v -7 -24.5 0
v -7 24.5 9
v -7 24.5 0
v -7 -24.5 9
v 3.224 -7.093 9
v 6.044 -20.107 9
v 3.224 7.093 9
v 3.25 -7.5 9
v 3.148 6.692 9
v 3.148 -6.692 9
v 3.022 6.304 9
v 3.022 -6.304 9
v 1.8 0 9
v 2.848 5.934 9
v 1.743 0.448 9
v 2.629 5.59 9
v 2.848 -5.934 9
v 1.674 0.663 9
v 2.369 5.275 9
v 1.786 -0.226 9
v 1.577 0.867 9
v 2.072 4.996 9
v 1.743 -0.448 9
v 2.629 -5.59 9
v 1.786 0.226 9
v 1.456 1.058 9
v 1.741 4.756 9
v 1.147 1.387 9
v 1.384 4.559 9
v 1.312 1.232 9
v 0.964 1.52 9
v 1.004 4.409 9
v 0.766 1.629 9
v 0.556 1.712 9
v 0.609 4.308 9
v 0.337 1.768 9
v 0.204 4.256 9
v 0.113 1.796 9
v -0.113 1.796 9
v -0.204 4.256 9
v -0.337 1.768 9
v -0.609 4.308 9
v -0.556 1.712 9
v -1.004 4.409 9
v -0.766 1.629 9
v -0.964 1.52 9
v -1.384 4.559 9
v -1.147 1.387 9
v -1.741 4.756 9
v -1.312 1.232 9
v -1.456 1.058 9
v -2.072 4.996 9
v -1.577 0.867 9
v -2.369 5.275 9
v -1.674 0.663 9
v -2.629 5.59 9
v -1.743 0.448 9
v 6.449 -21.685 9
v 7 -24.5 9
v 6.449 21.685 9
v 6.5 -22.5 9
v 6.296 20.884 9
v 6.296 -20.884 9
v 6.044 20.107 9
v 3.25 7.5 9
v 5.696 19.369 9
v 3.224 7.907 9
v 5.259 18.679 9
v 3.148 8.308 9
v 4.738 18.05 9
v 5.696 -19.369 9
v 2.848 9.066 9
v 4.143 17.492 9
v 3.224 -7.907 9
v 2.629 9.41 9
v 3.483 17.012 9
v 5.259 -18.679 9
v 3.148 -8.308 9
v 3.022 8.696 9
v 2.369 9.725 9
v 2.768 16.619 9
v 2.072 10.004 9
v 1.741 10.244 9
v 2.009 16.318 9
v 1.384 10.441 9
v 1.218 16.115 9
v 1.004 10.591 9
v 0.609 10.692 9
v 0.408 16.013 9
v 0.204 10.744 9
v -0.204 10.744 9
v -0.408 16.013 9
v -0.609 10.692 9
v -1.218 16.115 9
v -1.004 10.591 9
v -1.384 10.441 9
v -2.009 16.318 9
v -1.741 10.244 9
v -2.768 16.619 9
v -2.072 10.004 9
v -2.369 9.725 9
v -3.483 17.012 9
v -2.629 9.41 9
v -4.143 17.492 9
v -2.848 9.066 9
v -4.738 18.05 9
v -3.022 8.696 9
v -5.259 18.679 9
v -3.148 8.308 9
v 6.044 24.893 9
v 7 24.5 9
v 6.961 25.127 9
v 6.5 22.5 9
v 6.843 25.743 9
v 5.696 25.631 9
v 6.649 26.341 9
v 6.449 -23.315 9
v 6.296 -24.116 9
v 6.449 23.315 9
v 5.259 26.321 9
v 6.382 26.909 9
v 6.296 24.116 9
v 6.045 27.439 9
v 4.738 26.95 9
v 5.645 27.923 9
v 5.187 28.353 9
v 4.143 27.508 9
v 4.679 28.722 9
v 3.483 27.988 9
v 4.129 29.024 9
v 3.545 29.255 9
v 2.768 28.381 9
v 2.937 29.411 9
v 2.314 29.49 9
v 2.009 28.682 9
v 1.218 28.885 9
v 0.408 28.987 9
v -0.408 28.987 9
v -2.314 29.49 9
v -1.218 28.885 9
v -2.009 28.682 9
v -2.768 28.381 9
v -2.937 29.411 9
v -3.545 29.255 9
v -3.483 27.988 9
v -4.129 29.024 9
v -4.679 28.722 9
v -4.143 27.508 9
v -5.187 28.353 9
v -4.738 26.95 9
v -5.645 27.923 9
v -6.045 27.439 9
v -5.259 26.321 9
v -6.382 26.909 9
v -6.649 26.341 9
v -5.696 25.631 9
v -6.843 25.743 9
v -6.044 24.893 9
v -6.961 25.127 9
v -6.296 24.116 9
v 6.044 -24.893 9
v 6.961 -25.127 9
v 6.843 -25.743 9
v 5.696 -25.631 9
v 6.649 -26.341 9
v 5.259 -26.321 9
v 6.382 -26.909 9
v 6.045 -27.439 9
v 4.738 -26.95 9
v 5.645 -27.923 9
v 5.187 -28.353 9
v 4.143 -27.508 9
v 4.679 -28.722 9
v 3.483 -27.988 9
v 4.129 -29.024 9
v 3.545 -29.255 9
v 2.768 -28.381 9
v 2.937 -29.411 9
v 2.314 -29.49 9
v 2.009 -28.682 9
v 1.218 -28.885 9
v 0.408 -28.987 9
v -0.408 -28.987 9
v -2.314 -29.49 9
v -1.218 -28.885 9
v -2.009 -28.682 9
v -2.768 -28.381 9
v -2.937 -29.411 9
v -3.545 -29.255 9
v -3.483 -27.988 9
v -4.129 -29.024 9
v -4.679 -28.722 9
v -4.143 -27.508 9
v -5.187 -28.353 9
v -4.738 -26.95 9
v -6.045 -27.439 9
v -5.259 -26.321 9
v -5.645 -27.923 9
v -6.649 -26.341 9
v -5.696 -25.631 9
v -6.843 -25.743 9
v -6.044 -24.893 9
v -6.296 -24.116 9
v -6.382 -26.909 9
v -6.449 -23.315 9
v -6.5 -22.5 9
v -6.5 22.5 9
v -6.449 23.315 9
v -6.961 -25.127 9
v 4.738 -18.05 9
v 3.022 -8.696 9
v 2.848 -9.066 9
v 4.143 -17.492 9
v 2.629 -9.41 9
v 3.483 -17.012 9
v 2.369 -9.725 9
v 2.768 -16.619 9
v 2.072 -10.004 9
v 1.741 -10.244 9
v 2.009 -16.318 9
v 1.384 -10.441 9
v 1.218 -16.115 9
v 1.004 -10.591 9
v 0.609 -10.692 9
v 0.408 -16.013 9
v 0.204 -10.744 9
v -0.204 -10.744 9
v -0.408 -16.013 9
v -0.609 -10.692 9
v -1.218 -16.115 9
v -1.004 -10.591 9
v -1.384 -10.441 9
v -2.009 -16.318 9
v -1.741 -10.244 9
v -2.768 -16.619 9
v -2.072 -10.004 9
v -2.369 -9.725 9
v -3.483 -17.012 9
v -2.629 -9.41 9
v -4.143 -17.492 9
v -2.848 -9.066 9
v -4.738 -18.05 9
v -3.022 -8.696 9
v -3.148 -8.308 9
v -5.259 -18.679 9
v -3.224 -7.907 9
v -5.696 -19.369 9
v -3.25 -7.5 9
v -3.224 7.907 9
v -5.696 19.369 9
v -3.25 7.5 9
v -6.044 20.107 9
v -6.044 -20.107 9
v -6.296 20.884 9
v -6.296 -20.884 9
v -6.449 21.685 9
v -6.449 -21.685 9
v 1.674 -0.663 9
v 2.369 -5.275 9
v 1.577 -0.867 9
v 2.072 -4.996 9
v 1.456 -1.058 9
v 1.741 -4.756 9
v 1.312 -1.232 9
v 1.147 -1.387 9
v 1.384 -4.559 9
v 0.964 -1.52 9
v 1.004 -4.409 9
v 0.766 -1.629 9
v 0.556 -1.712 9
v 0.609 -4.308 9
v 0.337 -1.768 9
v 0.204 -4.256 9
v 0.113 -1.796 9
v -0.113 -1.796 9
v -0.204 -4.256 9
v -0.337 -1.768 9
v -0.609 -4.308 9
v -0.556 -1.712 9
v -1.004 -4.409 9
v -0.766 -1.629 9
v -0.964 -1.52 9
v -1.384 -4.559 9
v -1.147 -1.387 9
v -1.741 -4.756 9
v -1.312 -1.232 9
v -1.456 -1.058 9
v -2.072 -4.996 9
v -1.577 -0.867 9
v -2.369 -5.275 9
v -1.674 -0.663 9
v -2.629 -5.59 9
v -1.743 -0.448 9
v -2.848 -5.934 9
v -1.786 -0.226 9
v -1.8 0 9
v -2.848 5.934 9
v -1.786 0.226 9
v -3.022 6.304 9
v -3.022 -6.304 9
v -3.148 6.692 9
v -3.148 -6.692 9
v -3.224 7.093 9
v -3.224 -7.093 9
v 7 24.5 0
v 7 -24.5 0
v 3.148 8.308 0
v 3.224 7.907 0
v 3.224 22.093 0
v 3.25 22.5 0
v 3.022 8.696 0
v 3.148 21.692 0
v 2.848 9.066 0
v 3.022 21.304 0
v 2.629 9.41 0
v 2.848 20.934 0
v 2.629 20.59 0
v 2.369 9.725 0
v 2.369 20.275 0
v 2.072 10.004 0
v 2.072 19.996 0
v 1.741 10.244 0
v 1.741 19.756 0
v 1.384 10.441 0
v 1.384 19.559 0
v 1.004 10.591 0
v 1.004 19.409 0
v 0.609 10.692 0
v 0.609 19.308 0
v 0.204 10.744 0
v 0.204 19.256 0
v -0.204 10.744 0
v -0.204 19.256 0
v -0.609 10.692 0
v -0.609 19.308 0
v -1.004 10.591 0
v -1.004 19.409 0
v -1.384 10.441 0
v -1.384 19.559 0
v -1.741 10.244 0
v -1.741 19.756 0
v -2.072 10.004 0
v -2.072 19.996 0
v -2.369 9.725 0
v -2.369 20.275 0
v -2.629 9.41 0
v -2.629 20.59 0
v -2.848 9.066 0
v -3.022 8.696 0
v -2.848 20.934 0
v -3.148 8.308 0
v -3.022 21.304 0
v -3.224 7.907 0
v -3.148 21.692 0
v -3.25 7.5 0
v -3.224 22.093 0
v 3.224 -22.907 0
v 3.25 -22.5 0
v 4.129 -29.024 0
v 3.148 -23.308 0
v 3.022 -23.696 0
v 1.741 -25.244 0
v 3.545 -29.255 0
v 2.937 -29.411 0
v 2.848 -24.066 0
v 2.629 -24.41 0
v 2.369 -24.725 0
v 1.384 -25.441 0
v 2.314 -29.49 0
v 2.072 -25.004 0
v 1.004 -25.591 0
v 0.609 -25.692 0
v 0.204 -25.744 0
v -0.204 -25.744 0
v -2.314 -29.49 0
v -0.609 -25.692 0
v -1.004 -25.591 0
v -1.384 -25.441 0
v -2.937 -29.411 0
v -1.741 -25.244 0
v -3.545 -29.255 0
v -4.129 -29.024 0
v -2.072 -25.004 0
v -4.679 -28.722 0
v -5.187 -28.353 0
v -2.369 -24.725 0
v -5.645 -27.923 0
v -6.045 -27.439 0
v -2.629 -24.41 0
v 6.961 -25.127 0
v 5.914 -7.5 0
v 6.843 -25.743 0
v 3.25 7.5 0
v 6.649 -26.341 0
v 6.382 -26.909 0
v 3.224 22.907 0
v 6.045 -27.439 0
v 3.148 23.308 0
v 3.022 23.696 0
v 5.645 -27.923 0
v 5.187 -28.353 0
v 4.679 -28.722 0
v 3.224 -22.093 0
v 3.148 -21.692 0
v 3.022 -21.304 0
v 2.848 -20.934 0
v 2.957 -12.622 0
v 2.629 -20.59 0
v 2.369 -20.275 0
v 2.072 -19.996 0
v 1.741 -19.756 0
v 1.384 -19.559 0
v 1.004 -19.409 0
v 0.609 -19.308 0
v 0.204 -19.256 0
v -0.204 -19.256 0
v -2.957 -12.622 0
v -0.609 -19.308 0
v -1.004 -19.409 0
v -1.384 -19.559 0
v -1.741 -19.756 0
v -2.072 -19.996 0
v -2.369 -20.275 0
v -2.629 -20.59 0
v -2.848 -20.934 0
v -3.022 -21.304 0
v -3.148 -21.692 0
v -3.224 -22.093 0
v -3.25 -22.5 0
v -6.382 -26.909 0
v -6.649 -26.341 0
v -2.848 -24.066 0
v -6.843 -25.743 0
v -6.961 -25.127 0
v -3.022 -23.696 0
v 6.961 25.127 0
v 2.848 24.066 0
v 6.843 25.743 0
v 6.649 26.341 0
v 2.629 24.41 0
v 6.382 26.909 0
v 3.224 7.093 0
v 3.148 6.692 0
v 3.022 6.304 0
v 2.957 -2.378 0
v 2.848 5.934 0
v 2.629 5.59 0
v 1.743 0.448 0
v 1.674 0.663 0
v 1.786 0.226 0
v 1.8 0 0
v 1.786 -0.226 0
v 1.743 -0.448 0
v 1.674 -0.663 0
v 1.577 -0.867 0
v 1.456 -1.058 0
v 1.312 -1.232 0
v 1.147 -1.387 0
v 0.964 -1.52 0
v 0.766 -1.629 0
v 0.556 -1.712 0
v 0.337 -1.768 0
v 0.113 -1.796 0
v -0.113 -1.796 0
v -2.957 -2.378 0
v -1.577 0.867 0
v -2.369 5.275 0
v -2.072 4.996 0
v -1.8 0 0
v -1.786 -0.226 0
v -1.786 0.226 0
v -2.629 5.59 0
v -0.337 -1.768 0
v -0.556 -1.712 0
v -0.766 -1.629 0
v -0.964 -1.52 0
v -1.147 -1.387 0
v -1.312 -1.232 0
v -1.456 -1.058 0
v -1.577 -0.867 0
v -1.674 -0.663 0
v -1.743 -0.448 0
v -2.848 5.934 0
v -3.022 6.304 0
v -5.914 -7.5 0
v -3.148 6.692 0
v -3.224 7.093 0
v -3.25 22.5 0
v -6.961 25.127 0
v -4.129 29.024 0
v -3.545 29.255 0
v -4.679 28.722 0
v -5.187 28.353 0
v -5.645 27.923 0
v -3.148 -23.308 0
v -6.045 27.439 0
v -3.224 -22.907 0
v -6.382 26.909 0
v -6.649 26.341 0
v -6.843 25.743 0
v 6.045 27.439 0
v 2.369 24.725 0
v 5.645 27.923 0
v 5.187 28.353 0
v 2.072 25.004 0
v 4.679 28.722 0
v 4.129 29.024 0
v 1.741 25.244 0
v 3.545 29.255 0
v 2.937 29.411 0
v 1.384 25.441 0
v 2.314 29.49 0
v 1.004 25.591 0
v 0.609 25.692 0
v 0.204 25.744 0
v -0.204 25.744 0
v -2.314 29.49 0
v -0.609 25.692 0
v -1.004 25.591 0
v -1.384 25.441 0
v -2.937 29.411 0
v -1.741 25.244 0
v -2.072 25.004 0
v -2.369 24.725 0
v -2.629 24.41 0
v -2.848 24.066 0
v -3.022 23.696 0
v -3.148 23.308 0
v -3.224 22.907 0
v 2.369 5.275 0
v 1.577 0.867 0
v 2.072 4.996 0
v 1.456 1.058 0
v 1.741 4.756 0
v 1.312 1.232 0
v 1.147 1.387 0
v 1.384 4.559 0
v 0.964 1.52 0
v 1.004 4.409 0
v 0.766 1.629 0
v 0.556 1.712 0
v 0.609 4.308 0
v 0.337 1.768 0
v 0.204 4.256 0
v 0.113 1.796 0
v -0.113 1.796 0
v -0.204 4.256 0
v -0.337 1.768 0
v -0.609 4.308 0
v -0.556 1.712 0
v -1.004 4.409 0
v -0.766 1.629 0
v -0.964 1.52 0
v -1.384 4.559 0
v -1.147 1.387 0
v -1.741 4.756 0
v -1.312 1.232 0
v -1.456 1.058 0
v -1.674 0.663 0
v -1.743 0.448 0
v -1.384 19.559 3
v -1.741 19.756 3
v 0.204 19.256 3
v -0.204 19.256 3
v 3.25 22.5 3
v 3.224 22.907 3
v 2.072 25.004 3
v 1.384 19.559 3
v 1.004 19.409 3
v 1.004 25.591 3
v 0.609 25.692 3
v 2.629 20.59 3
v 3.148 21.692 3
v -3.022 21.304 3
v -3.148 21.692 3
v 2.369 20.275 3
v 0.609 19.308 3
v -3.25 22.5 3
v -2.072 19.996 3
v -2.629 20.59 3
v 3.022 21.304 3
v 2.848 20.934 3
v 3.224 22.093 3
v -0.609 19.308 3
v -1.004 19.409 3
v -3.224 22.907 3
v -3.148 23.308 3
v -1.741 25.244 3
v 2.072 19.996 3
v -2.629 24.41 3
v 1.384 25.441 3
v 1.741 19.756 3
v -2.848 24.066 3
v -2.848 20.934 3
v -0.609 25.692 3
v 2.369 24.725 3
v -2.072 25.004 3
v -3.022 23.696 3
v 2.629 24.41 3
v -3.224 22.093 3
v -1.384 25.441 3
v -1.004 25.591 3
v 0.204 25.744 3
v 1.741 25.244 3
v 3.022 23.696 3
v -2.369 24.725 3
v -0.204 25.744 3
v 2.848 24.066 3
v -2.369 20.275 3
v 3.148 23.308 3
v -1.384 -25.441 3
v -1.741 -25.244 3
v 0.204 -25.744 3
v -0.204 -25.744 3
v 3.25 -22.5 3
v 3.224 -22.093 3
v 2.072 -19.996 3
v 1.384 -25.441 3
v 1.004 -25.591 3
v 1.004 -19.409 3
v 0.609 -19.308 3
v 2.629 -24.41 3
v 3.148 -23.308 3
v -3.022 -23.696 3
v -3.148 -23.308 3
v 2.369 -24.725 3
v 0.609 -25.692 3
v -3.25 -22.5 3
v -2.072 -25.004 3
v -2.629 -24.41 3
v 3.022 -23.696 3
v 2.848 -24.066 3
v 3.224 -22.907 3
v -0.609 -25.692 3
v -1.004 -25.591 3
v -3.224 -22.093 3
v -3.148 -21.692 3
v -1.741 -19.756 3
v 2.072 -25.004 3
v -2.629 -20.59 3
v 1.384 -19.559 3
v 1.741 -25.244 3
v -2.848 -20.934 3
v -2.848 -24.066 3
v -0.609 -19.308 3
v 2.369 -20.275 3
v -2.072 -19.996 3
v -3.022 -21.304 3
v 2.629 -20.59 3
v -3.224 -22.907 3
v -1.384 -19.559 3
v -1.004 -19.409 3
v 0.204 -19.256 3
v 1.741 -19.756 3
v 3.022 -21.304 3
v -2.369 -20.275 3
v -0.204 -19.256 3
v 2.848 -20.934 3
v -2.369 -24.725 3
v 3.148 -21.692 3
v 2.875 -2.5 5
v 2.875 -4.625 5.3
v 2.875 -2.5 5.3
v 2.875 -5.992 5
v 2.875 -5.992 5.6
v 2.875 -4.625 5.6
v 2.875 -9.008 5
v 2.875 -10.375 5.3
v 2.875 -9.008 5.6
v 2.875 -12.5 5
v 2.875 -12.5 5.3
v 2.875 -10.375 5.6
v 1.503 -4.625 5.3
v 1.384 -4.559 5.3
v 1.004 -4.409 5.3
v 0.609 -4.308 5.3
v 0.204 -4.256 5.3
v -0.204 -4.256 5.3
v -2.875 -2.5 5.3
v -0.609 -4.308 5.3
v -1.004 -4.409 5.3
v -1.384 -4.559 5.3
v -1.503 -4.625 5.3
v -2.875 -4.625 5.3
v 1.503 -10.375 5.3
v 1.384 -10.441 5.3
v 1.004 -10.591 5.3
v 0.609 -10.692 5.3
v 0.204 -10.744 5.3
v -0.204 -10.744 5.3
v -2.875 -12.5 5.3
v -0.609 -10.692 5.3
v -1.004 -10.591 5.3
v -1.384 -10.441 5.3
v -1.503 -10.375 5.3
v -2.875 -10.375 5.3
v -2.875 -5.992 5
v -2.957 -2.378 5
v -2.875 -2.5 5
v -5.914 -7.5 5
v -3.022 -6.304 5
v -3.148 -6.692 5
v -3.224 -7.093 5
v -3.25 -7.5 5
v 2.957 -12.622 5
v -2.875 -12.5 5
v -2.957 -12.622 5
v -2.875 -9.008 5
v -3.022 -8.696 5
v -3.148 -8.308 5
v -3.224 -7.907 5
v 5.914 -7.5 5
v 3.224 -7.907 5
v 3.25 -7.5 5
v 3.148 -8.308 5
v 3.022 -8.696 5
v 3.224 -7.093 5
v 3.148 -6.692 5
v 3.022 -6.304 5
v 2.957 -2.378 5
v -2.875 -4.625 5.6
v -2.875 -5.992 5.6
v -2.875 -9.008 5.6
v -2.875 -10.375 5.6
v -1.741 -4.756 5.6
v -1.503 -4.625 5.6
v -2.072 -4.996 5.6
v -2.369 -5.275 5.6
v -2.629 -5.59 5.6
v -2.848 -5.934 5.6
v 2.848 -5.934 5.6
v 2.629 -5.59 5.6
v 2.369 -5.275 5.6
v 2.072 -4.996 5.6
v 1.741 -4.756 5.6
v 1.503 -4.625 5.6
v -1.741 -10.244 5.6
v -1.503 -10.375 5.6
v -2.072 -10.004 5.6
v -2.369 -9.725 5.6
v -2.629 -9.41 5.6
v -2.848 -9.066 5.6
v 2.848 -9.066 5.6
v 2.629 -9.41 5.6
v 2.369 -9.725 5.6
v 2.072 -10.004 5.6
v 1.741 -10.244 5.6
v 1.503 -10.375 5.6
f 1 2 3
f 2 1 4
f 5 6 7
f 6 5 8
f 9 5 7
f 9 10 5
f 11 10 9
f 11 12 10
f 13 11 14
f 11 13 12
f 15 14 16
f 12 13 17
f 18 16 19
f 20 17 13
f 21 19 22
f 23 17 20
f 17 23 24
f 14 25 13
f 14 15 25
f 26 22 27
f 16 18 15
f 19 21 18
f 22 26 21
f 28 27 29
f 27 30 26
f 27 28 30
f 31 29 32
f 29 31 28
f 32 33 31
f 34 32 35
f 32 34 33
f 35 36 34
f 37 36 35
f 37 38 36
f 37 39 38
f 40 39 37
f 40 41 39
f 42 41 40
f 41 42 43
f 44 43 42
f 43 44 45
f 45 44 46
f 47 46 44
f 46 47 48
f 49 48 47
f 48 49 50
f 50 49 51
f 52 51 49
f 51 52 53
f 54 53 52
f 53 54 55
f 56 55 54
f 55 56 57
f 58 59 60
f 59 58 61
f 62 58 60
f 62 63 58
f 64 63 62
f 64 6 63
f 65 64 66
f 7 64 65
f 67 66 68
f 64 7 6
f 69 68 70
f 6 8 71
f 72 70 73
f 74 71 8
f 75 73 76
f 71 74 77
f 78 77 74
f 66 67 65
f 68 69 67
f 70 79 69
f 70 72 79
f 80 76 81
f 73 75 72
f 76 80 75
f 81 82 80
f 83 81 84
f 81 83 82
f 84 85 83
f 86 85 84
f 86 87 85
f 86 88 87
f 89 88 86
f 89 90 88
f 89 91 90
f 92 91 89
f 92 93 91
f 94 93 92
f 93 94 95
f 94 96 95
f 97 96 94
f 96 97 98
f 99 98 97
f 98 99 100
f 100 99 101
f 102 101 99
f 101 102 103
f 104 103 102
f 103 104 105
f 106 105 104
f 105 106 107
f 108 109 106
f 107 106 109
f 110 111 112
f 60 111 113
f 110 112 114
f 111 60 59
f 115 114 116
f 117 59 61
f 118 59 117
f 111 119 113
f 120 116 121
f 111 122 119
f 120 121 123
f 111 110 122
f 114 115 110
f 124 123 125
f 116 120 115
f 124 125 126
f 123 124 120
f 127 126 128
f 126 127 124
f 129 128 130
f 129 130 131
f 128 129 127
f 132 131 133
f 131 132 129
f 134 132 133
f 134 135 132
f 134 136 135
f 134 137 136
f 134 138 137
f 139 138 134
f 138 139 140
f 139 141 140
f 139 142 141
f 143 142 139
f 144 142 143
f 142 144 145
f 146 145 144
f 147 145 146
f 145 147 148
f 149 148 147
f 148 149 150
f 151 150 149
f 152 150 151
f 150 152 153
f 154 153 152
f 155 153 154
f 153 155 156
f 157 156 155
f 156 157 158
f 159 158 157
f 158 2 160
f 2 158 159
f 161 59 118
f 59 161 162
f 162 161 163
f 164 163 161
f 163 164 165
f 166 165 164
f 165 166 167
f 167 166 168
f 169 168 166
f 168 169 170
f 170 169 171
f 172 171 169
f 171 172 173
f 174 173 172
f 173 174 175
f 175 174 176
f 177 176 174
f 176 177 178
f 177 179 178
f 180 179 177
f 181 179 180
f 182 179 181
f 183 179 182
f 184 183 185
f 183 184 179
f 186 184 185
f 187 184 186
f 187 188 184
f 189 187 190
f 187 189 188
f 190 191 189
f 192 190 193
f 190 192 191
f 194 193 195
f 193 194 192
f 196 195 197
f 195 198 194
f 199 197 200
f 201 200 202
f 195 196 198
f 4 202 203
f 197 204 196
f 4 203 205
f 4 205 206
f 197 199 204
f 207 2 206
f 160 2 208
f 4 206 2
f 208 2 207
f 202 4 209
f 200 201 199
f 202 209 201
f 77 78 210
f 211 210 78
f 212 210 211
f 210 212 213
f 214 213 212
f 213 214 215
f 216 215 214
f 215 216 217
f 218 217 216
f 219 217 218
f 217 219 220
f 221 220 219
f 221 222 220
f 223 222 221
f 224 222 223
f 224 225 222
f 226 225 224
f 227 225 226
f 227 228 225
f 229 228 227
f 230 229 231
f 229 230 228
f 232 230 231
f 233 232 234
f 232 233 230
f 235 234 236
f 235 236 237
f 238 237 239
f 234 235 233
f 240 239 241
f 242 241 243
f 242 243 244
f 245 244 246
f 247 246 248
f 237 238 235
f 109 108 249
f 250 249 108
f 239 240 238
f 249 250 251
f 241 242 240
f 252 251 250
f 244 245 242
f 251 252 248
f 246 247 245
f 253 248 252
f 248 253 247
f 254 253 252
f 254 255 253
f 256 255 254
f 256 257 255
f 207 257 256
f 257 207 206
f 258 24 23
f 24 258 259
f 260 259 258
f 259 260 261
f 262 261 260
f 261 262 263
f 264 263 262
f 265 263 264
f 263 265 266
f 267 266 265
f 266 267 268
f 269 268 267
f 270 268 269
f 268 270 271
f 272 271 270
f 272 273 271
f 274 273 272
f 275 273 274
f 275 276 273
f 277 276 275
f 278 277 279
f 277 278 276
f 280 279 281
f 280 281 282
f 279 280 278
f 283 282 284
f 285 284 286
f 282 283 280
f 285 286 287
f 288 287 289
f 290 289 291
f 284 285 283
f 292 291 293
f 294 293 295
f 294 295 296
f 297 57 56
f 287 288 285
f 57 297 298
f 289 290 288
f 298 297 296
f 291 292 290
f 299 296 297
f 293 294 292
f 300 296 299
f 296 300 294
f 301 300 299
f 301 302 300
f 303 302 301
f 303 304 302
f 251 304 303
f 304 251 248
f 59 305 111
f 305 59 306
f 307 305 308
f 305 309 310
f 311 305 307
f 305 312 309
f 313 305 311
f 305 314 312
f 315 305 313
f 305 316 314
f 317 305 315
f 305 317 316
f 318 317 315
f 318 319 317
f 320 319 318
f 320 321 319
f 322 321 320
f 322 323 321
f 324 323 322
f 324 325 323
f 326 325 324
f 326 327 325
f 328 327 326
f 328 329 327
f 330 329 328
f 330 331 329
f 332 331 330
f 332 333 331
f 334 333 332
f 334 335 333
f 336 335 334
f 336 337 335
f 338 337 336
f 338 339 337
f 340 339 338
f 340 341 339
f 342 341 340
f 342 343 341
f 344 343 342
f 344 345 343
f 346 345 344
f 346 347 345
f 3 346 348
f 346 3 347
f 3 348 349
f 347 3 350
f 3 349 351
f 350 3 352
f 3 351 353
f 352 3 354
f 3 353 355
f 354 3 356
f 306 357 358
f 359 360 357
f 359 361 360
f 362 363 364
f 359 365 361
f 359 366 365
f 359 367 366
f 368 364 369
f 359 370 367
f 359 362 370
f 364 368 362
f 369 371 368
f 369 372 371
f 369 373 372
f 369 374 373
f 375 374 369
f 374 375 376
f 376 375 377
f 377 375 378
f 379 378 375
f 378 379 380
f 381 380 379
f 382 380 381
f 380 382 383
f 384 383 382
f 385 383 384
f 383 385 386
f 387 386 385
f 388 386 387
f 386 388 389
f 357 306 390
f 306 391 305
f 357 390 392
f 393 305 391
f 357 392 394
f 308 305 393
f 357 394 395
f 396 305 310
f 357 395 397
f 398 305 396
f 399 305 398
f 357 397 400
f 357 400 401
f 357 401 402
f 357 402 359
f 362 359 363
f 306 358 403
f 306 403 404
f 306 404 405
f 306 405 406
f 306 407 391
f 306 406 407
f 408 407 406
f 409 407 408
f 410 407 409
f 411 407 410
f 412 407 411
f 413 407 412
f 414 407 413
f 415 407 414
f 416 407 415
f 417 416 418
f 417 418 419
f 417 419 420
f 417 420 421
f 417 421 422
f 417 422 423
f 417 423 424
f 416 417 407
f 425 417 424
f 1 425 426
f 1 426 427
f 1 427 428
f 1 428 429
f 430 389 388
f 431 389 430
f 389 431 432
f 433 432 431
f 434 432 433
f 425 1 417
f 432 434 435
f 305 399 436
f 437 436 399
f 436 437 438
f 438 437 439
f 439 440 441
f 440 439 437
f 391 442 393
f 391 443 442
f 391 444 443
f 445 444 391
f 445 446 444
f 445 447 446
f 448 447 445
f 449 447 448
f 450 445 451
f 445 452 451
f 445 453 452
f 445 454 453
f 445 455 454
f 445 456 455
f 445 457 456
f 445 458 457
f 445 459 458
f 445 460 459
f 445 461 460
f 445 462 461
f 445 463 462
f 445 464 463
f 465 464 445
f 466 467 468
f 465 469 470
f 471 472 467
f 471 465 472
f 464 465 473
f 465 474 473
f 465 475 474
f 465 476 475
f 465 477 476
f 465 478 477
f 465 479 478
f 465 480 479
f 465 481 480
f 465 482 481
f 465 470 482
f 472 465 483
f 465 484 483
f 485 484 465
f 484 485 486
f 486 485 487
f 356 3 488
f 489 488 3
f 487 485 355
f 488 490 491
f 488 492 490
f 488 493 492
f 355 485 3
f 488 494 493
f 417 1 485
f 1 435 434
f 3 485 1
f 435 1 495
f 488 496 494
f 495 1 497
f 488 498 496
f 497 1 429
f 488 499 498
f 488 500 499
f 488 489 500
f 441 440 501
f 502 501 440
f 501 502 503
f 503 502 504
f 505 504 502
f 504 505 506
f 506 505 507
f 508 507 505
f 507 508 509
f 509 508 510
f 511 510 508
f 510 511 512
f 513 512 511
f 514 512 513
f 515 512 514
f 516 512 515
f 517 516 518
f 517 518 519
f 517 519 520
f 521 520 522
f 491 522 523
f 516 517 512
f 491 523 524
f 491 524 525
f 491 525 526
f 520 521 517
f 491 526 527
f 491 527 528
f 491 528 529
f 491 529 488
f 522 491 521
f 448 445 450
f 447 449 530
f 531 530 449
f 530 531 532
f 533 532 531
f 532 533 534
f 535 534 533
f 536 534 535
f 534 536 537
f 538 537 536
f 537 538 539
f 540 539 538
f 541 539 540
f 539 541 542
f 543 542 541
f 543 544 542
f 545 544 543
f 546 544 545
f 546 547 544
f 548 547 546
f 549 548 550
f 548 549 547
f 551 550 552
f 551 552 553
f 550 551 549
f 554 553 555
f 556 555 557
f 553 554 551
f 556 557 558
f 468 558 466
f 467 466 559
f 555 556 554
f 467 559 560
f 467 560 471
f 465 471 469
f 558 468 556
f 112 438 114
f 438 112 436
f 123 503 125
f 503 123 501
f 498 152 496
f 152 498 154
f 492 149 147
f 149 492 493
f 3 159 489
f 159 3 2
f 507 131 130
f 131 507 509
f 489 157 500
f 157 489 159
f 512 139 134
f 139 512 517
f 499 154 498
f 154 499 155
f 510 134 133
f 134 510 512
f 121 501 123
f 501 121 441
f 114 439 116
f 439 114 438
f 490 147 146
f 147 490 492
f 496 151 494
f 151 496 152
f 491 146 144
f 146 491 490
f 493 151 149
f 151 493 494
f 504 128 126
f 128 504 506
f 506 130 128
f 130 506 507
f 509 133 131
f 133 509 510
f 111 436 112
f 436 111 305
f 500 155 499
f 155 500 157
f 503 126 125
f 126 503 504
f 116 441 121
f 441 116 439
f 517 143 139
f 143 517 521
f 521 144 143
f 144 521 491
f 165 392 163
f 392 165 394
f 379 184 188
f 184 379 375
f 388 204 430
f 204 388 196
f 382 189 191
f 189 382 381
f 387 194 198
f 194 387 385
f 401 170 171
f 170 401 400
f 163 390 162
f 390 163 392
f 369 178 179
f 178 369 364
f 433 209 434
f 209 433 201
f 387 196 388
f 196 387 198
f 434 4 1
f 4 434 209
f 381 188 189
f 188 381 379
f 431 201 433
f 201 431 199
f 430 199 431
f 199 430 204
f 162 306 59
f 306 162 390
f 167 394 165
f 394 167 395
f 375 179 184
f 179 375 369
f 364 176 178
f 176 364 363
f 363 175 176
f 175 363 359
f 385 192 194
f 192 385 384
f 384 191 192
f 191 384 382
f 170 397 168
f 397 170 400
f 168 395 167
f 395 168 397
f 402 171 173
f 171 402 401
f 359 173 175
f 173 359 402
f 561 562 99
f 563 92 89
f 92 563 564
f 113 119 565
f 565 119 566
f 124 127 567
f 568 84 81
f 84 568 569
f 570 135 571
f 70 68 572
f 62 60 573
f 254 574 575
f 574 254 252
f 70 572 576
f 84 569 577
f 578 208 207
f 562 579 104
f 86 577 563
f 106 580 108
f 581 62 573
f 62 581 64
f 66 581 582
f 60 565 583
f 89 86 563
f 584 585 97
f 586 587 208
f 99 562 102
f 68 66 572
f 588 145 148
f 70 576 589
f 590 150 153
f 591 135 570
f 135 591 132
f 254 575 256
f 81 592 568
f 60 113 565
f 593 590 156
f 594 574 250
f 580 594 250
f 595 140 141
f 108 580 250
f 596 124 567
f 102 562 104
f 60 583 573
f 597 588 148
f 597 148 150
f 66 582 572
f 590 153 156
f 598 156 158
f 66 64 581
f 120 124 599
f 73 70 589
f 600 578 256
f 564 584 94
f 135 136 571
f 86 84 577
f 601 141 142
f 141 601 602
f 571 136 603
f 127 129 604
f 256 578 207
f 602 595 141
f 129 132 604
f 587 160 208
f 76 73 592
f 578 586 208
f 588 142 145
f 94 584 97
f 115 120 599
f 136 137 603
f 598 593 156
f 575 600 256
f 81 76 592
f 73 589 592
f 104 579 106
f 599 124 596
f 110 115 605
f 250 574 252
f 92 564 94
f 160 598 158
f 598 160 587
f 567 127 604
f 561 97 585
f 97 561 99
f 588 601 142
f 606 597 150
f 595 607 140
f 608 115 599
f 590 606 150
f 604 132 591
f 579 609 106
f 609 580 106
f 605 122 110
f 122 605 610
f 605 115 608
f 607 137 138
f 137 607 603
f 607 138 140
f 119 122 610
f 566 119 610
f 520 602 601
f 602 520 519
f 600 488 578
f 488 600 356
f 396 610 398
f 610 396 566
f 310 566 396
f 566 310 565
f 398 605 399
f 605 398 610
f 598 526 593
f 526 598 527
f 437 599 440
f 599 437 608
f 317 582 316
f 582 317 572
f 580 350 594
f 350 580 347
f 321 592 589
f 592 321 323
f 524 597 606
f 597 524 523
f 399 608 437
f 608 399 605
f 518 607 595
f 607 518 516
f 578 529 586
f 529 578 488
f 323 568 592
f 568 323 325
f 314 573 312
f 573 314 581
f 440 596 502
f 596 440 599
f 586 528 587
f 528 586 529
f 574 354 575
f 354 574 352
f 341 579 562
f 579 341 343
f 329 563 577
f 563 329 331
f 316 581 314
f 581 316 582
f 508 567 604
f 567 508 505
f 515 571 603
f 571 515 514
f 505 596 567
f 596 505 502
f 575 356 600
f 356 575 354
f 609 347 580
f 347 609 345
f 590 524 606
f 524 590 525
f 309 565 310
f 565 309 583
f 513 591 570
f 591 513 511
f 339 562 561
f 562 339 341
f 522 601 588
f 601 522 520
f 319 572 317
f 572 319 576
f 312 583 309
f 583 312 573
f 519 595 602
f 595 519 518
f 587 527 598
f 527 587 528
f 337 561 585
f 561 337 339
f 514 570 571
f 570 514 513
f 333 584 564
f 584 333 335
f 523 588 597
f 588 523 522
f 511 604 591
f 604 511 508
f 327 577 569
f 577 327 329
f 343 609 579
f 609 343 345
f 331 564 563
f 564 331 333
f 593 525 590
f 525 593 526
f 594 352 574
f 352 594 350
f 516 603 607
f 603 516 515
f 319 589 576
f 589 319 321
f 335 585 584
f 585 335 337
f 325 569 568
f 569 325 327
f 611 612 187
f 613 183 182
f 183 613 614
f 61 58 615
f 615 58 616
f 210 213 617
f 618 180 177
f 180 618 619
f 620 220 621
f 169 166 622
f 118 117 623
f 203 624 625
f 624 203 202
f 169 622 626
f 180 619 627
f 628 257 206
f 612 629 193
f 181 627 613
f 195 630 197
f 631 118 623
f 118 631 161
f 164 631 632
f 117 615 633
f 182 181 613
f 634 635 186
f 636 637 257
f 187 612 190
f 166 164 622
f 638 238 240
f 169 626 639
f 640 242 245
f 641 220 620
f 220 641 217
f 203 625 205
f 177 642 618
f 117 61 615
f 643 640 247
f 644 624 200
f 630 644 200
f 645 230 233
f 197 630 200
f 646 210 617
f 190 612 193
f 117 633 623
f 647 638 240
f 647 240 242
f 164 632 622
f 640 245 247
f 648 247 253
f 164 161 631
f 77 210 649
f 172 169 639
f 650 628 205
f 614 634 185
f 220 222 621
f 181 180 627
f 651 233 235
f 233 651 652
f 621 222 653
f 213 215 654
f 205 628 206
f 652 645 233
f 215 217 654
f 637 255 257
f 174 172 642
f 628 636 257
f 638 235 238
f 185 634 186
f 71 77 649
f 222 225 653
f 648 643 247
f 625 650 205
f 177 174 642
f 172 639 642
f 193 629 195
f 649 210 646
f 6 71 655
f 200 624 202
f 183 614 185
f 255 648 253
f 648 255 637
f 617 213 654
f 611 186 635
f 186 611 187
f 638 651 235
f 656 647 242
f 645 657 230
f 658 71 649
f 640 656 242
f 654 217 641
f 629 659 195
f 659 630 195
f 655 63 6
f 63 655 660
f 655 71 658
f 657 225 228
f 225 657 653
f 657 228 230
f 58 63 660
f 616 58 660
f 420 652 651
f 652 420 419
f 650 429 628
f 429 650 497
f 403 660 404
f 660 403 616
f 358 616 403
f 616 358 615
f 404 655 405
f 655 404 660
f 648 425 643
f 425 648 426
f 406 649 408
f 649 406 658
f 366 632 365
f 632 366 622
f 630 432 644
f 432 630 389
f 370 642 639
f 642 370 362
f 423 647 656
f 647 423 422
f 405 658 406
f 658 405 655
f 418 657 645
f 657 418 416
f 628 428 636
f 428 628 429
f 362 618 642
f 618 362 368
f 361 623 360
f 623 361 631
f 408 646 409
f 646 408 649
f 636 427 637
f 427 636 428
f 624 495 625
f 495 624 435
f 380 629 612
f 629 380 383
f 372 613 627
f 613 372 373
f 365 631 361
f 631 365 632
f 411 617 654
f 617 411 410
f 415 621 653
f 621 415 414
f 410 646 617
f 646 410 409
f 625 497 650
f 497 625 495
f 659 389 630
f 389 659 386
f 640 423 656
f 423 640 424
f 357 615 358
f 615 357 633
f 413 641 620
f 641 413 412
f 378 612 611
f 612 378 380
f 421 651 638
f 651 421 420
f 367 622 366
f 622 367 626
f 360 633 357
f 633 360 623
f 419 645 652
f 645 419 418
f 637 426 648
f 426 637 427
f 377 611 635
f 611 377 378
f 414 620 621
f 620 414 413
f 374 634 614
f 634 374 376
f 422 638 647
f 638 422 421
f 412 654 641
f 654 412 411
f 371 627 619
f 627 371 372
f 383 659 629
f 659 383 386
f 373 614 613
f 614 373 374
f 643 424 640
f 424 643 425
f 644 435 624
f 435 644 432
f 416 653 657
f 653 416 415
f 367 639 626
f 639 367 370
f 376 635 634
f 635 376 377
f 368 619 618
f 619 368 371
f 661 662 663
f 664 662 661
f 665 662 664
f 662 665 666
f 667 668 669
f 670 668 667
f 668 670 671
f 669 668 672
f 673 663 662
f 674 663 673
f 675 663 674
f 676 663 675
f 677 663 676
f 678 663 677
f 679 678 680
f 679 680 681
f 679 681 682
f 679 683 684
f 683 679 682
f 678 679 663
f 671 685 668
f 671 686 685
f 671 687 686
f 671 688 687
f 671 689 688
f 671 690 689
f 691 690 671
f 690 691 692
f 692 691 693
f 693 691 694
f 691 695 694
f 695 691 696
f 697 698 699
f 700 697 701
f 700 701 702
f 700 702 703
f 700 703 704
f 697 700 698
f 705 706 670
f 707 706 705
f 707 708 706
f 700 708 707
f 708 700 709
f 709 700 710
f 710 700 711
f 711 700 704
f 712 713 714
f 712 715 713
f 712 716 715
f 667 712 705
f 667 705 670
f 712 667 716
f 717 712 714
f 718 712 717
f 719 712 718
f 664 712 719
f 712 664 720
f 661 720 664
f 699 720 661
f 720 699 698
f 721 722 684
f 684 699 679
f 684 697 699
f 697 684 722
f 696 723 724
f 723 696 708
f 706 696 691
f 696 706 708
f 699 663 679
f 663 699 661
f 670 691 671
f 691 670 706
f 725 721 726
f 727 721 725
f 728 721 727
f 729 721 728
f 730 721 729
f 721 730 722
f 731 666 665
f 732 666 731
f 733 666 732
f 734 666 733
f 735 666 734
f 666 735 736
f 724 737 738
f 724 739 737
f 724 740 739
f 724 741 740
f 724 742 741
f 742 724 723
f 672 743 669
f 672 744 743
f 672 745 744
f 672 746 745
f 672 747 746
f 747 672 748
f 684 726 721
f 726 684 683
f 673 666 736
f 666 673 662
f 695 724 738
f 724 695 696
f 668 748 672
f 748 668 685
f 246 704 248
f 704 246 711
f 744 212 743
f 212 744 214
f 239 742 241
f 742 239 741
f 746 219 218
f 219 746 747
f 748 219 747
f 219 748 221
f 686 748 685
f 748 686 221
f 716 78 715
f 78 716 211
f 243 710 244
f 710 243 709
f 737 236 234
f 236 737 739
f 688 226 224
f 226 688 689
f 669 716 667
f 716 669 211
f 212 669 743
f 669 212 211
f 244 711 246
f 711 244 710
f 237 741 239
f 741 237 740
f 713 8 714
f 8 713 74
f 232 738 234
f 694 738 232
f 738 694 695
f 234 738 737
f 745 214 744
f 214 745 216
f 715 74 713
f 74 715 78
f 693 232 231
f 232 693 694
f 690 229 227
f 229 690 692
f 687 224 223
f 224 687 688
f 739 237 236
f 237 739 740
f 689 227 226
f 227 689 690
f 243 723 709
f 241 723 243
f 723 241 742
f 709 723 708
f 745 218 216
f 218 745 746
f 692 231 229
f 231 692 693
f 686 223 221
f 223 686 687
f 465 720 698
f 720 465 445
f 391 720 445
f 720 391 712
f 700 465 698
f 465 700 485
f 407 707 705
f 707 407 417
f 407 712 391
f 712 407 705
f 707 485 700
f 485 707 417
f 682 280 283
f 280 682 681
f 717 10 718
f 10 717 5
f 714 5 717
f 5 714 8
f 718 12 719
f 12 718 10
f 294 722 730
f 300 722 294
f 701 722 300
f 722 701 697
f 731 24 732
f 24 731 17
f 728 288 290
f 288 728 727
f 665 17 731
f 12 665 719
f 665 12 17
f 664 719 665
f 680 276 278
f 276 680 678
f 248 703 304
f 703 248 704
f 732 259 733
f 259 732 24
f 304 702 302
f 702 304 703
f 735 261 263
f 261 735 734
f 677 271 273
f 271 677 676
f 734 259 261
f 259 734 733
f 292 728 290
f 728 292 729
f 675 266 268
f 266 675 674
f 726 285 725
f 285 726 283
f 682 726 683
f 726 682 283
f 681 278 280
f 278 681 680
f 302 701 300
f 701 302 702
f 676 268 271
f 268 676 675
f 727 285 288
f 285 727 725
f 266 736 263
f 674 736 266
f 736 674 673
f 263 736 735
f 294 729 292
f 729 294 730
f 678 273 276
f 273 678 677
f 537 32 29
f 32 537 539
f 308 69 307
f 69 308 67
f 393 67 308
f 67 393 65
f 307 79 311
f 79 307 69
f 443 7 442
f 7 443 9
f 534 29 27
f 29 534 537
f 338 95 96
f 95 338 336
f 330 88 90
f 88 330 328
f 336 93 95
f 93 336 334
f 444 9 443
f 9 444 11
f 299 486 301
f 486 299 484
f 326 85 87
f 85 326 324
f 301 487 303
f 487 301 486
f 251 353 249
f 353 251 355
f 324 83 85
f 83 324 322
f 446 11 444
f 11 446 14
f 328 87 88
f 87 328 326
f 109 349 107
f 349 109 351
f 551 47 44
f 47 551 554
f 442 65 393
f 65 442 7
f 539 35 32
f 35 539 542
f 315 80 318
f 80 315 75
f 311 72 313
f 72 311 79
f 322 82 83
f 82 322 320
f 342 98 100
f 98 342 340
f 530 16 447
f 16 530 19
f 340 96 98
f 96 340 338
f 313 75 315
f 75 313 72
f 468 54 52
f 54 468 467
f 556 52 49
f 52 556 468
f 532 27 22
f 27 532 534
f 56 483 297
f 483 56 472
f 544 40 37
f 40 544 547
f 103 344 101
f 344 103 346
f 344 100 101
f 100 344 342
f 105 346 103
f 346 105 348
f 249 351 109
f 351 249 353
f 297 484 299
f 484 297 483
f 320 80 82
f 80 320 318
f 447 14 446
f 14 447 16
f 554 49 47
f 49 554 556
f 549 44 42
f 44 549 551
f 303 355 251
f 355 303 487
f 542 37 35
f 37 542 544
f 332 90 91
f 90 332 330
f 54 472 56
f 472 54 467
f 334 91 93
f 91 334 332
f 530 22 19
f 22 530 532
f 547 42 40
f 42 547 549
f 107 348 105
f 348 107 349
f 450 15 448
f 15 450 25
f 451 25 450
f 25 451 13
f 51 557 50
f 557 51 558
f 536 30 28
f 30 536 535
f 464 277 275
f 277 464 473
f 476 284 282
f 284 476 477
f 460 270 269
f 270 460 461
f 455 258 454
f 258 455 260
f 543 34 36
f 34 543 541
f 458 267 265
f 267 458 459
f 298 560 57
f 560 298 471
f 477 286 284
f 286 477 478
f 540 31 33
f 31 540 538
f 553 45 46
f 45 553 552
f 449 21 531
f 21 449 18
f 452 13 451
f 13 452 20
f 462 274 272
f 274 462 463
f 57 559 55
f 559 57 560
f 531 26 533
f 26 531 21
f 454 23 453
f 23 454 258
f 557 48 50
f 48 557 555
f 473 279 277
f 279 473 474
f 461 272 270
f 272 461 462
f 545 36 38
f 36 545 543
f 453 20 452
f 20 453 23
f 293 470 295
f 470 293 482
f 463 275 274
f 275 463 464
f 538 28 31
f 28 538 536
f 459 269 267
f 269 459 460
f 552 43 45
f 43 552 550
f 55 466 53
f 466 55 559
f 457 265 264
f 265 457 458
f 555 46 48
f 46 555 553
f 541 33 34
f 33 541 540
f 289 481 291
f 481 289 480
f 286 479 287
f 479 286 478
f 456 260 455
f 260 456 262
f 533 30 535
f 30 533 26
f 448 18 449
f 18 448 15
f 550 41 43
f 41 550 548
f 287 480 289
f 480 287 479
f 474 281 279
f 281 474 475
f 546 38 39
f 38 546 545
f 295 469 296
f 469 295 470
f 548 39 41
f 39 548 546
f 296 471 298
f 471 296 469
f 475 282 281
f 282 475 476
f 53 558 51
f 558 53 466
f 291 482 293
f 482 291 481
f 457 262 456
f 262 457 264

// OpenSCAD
$fn = 50;


difference() {
	union() {
		hull() {
			translate(v = [-2.0000000000, 9.5000000000, 0]) {
				cylinder(h = 9, r = 5);
			}
			translate(v = [2.0000000000, 9.5000000000, 0]) {
				cylinder(h = 9, r = 5);
			}
			translate(v = [-2.0000000000, -9.5000000000, 0]) {
				cylinder(h = 9, r = 5);
			}
			translate(v = [2.0000000000, -9.5000000000, 0]) {
				cylinder(h = 9, r = 5);
			}
		}
		translate(v = [0.0000000000, 15.0000000000, 0]) {
			hull() {
				translate(v = [-2.0000000000, 9.5000000000, 0]) {
					cylinder(h = 9, r = 5);
				}
				translate(v = [2.0000000000, 9.5000000000, 0]) {
					cylinder(h = 9, r = 5);
				}
				translate(v = [-2.0000000000, -9.5000000000, 0]) {
					cylinder(h = 9, r = 5);
				}
				translate(v = [2.0000000000, -9.5000000000, 0]) {
					cylinder(h = 9, r = 5);
				}
			}
		}
		translate(v = [0.0000000000, 15.0000000000, 0]) {
			hull() {
				translate(v = [-2.0000000000, 9.5000000000, 0]) {
					cylinder(h = 9, r = 5);
				}
				translate(v = [2.0000000000, 9.5000000000, 0]) {
					cylinder(h = 9, r = 5);
				}
				translate(v = [-2.0000000000, -9.5000000000, 0]) {
					cylinder(h = 9, r = 5);
				}
				translate(v = [2.0000000000, -9.5000000000, 0]) {
					cylinder(h = 9, r = 5);
				}
			}
		}
		translate(v = [0.0000000000, -15.0000000000, 0]) {
			hull() {
				translate(v = [-2.0000000000, 9.5000000000, 0]) {
					cylinder(h = 9, r = 5);
				}
				translate(v = [2.0000000000, 9.5000000000, 0]) {
					cylinder(h = 9, r = 5);
				}
				translate(v = [-2.0000000000, -9.5000000000, 0]) {
					cylinder(h = 9, r = 5);
				}
				translate(v = [2.0000000000, -9.5000000000, 0]) {
					cylinder(h = 9, r = 5);
				}
			}
		}
		translate(v = [0.0000000000, -15.0000000000, 0]) {
			hull() {
				translate(v = [-2.0000000000, 9.5000000000, 0]) {
					cylinder(h = 9, r = 5);
				}
				translate(v = [2.0000000000, 9.5000000000, 0]) {
					cylinder(h = 9, r = 5);
				}
				translate(v = [-2.0000000000, -9.5000000000, 0]) {
					cylinder(h = 9, r = 5);
				}
				translate(v = [2.0000000000, -9.5000000000, 0]) {
					cylinder(h = 9, r = 5);
				}
			}
		}
	}
	union() {
		translate(v = [0.0000000000, 22.5000000000, 9]) {
			rotate(a = [0, 0, 0]) {
				difference() {
					union() {
						#translate(v = [0, 0, -9.0000000000]) {
							cylinder(h = 9, r = 2.2500000000);
						}
						#translate(v = [0, 0, -6]) {
							cylinder(h = 6, r1 = 3.2500000000, r2 = 6.5000000000);
						}
						#translate(v = [0, 0, -9.0000000000]) {
							cylinder(h = 9, r = 3.2500000000);
						}
						#translate(v = [0, 0, -9.0000000000]) {
							cylinder(h = 9, r = 2.2500000000);
						}
					}
					union();
				}
			}
		}
		translate(v = [0.0000000000, 22.5000000000, 9]) {
			rotate(a = [0, 0, 0]) {
				difference() {
					union() {
						#translate(v = [0, 0, -9.0000000000]) {
							cylinder(h = 9, r = 2.2500000000);
						}
						#translate(v = [0, 0, -6]) {
							cylinder(h = 6, r1 = 3.2500000000, r2 = 6.5000000000);
						}
						#translate(v = [0, 0, -9.0000000000]) {
							cylinder(h = 9, r = 3.2500000000);
						}
						#translate(v = [0, 0, -9.0000000000]) {
							cylinder(h = 9, r = 2.2500000000);
						}
					}
					union();
				}
			}
		}
		translate(v = [0.0000000000, -22.5000000000, 9]) {
			rotate(a = [0, 0, 0]) {
				difference() {
					union() {
						#translate(v = [0, 0, -9.0000000000]) {
							cylinder(h = 9, r = 2.2500000000);
						}
						#translate(v = [0, 0, -6]) {
							cylinder(h = 6, r1 = 3.2500000000, r2 = 6.5000000000);
						}
						#translate(v = [0, 0, -9.0000000000]) {
							cylinder(h = 9, r = 3.2500000000);
						}
						#translate(v = [0, 0, -9.0000000000]) {
							cylinder(h = 9, r = 2.2500000000);
						}
					}
					union();
				}
			}
		}
		translate(v = [0.0000000000, -22.5000000000, 9]) {
			rotate(a = [0, 0, 0]) {
				difference() {
					union() {
						#translate(v = [0, 0, -9.0000000000]) {
							cylinder(h = 9, r = 2.2500000000);
						}
						#translate(v = [0, 0, -6]) {
							cylinder(h = 6, r1 = 3.2500000000, r2 = 6.5000000000);
						}
						#translate(v = [0, 0, -9.0000000000]) {
							cylinder(h = 9, r = 3.2500000000);
						}
						#translate(v = [0, 0, -9.0000000000]) {
							cylinder(h = 9, r = 2.2500000000);
						}
					}
					union();
				}
			}
		}
		translate(v = [0.0000000000, -7.5000000000, 0]) {
			rotate(a = [0, 0, 0]) {
				difference() {
					union() {
						#translate(v = [-2.8750000000, -5.0000000000, -0.3000000000]) {
							cube(size = [5.7500000000, 10, 0.3000000000]);
						}
						#translate(v = [-2.8750000000, -2.8750000000, -0.6000000000]) {
							cube(size = [5.7500000000, 5.7500000000, 0.3000000000]);
						}
						#translate(v = [-2.8750000000, -5.0000000000, 5]) {
							cube(size = [5.7500000000, 10, 0.3000000000]);
						}
						#translate(v = [-2.8750000000, -2.8750000000, 5.3000000000]) {
							cube(size = [5.7500000000, 5.7500000000, 0.3000000000]);
						}
						#translate(v = [0, 0, -100.0000000000]) {
							cylinder(h = 200, r = 3.2500000000);
						}
						#linear_extrude(height = 5) {
							polygon(points = [[5.9142500000, 0.0000000000], [2.9571250000, 5.1218907443], [-2.9571250000, 5.1218907443], [-5.9142500000, 0.0000000000], [-2.9571250000, -5.1218907443], [2.9571250000, -5.1218907443]]);
						}
						#translate(v = [-2.8750000000, -5.0000000000, -0.3000000000]) {
							cube(size = [5.7500000000, 10, 0.3000000000]);
						}
						#translate(v = [-2.8750000000, -2.8750000000, -0.6000000000]) {
							cube(size = [5.7500000000, 5.7500000000, 0.3000000000]);
						}
						#translate(v = [-2.8750000000, -5.0000000000, 5]) {
							cube(size = [5.7500000000, 10, 0.3000000000]);
						}
						#translate(v = [-2.8750000000, -2.8750000000, 5.3000000000]) {
							cube(size = [5.7500000000, 5.7500000000, 0.3000000000]);
						}
						#translate(v = [0, 0, -100.0000000000]) {
							cylinder(h = 200, r = 3.2500000000);
						}
						#translate(v = [-2.8750000000, -5.0000000000, -0.3000000000]) {
							cube(size = [5.7500000000, 10, 0.3000000000]);
						}
						#translate(v = [-2.8750000000, -2.8750000000, -0.6000000000]) {
							cube(size = [5.7500000000, 5.7500000000, 0.3000000000]);
						}
						#translate(v = [-2.8750000000, -5.0000000000, 5]) {
							cube(size = [5.7500000000, 10, 0.3000000000]);
						}
						#translate(v = [-2.8750000000, -2.8750000000, 5.3000000000]) {
							cube(size = [5.7500000000, 5.7500000000, 0.3000000000]);
						}
						#translate(v = [0, 0, -100.0000000000]) {
							cylinder(h = 200, r = 3.2500000000);
						}
					}
					union();
				}
			}
		}
		translate(v = [0.0000000000, -7.5000000000, 0]) {
			translate(v = [0, 0, -100]) {
				cylinder(h = 200, r = 3.2500000000);
			}
		}
		translate(v = [0.0000000000, 7.5000000000, 0]) {
			translate(v = [0, 0, -100]) {
				cylinder(h = 200, r = 3.2500000000);
			}
		}
		translate(v = [0.0000000000, -7.5000000000, 0]) {
			translate(v = [0, 0, -100]) {
				cylinder(h = 200, r = 1.8000000000);
			}
		}
		translate(v = [0, 0, -100]) {
			cylinder(h = 200, r = 1.8000000000);
		}
		translate(v = [0.0000000000, 7.5000000000, 0]) {
			translate(v = [0, 0, -100]) {
				cylinder(h = 200, r = 1.8000000000);
			}
		}
	}
}
